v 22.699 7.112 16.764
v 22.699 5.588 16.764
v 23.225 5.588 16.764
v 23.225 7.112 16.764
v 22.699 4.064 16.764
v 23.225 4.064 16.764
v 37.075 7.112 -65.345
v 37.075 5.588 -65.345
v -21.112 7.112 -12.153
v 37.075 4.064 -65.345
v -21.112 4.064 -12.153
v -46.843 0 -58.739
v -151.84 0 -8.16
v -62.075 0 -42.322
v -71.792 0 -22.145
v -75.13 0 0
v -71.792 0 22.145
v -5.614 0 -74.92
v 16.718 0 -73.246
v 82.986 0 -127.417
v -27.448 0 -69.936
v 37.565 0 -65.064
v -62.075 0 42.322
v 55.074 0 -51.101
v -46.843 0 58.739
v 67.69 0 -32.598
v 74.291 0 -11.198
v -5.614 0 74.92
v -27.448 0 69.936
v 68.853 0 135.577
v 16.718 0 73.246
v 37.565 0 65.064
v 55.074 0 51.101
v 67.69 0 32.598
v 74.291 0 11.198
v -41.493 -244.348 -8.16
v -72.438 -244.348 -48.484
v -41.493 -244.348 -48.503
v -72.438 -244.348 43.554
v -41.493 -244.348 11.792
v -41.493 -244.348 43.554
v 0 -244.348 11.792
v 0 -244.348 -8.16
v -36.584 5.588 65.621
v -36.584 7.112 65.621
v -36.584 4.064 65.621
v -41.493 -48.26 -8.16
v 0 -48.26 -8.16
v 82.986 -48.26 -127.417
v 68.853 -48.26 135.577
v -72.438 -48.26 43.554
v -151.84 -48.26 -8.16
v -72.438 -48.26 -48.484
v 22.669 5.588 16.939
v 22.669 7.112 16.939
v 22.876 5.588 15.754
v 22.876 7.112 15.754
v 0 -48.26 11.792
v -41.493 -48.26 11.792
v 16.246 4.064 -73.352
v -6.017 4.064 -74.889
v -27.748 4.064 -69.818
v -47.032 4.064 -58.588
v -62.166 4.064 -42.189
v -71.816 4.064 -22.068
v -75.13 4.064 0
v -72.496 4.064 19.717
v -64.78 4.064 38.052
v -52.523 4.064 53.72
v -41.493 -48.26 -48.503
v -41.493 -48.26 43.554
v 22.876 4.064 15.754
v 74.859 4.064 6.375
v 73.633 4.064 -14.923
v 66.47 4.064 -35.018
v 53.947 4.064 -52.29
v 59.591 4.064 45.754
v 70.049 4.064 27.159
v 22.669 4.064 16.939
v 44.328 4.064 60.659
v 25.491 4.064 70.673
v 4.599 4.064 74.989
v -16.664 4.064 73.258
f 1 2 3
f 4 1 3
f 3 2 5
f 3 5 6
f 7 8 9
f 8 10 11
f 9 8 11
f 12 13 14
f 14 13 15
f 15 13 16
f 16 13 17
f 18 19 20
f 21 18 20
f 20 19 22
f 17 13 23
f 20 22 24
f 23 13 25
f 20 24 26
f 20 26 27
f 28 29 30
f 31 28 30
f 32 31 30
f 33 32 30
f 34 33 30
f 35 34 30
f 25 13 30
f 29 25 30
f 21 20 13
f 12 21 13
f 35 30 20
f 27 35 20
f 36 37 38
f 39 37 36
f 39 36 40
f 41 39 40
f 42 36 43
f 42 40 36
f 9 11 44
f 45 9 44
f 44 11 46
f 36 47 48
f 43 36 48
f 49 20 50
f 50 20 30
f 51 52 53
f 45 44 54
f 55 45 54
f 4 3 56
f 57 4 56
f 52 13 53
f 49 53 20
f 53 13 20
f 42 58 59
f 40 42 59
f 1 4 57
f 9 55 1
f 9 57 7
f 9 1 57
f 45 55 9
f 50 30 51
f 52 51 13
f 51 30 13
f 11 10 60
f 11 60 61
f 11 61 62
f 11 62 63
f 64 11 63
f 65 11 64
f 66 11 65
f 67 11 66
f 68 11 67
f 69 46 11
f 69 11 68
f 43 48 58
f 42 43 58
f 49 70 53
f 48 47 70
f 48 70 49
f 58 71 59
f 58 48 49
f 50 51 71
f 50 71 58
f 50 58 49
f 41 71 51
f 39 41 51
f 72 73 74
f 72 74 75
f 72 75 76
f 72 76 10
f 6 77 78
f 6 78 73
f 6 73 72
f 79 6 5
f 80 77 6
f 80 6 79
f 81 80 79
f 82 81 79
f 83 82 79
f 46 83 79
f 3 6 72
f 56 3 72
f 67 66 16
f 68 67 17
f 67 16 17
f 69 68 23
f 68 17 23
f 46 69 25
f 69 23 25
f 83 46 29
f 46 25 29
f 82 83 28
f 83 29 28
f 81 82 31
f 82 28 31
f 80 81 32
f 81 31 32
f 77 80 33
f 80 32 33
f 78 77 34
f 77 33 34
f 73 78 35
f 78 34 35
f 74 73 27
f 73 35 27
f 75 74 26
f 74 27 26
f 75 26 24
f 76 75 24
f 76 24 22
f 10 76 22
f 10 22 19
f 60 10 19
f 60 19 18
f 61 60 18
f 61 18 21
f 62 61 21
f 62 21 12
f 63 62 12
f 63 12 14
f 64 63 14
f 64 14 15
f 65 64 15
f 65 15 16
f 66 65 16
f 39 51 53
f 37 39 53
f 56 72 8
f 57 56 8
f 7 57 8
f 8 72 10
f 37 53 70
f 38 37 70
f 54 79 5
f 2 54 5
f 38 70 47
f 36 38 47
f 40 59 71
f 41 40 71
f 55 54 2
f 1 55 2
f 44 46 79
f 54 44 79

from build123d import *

# Parameters (mm, degrees)
F1_DEPTH = 48.26
F2_R     = 75.1298165033
F3_DEPTH = 4.064
F6_DEPTH = 1.524
F7_DEPTH = 1.524
F9_DEPTH = 196.088


with BuildPart() as f1:
    # F0 (on Front) → F1 (new body)
    with BuildSketch(Plane.XZ):
        with BuildLine():
            ThreePointArc((-34.4267364961, -67.788390466), (39.7682207439, -64.7993417143), (76.0293763472, 0))
            ThreePointArc((76.0293763472, 0), (76.0019863824, 2.0406209035), (75.9198362228, 4.0797715191))
            ThreePointArc((75.9198362228, 4.0797715191), (34.4267338783, 67.7883917955), (-41.4931009863, 63.7086229507))
            ThreePointArc((-41.4931009863, 63.7086229507), (-75.9198364409, -4.0797674593), (-34.4267364961, -67.788390466))
        make_face()
        with BuildLine():
            Line((-151.8396729123, -8.159534353), (-34.4267364961, -67.788390466))
            ThreePointArc((-34.4267364961, -67.788390466), (-75.9198364409, -4.0797674593), (-41.4931009863, 63.7086229507))
            Line((-41.4931009863, 63.7086229507), (-151.8396729123, -8.159534353))
        make_face()
        with BuildLine():
            ThreePointArc((-41.4931009863, 63.7086229507), (34.4267338783, 67.7883917955), (75.9198362228, 4.0797715191))
            Line((75.9198362228, 4.0797715191), (68.8534724234, 135.5767812208))
            Line((68.8534724234, 135.5767812208), (-41.4931009863, 63.7086229507))
        make_face()
        with BuildLine():
            ThreePointArc((75.9198362228, 4.0797715191), (76.0019863824, 2.0406209035), (76.0293763472, 0))
            ThreePointArc((76.0293763472, 0), (39.7682207439, -64.7993417143), (-34.4267364961, -67.788390466))
            Line((-34.4267364961, -67.788390466), (82.9862004889, -127.4172468679))
            Line((82.9862004889, -127.4172468679), (75.9198362228, 4.0797715191))
        make_face()
    extrude(amount=F1_DEPTH)

    # F2 (on face) → F3 (join)
    with BuildSketch(Plane(origin=(0, 0, 0), x_dir=(-1, 0, 0), z_dir=(0, 1, 0))):
        Circle(F2_R)
    extrude(amount=F3_DEPTH)

    # F4 (on face) + F5 (on face) → F6 (join)
    with BuildSketch(Plane(origin=(0, 4.064, 0), x_dir=(-1, 0, 0), z_dir=(0, 1, 0))):
        Polygon((21.1120117456, -12.1532529593), (36.5837341302, 65.6210311174), (-22.6685176048, 16.9392599994), (-37.0748307403, -65.3448257584), align=None)
    with BuildSketch(Plane(origin=(0, 4.064, 0), x_dir=(-1, 0, 0), z_dir=(0, 1, 0))):
        Polygon((-11.7188123986, -16.5306981653), (21.1120117456, -11.42368), (12.0517571455, 16.7637839913), (-23.2249982655, 16.7637839913), align=None)
    extrude(amount=F6_DEPTH)

    # F5 (on face) + F6_face (on face) → F7 (join)
    with BuildSketch(Plane(origin=(0, 4.064, 0), x_dir=(-1, 0, 0), z_dir=(0, 1, 0))):
        Polygon((-11.7188123986, -16.5306981653), (21.1120117456, -11.42368), (12.0517571455, 16.7637839913), (-23.2249982655, 16.7637839913), align=None)
    with BuildSketch(Plane(origin=(0.8615921518, 5.588, 1.1811459069), x_dir=(-1, 0, 0), z_dir=(0, 1, 0))):
        Polygon((-36.2132385885, -66.5259716654), (21.9736038974, -13.3343988662), (37.445326282, 64.4398852105), (-21.806925453, 15.7581140924), (-21.8376478253, 15.5826380844), (-22.3634061137, 15.5826380844), (-22.0144394867, 14.5728627107), align=None)
    extrude(amount=F7_DEPTH)

    # F8 (on face) → F9 (join)
    with BuildSketch(Plane.XZ.offset(48.26)):
        Polygon((-72.4382175174, 43.5542269979), (-72.4382175174, -48.4840343904), (-41.4931002444, -48.503398313), (-41.4931002444, -8.159534353), (0, -8.159534353), (0, 11.7922946811), (-41.4931002444, 11.7922946811), (-41.4931002444, 43.5542269979), align=None)
    extrude(amount=F9_DEPTH)


solid = f1.part
